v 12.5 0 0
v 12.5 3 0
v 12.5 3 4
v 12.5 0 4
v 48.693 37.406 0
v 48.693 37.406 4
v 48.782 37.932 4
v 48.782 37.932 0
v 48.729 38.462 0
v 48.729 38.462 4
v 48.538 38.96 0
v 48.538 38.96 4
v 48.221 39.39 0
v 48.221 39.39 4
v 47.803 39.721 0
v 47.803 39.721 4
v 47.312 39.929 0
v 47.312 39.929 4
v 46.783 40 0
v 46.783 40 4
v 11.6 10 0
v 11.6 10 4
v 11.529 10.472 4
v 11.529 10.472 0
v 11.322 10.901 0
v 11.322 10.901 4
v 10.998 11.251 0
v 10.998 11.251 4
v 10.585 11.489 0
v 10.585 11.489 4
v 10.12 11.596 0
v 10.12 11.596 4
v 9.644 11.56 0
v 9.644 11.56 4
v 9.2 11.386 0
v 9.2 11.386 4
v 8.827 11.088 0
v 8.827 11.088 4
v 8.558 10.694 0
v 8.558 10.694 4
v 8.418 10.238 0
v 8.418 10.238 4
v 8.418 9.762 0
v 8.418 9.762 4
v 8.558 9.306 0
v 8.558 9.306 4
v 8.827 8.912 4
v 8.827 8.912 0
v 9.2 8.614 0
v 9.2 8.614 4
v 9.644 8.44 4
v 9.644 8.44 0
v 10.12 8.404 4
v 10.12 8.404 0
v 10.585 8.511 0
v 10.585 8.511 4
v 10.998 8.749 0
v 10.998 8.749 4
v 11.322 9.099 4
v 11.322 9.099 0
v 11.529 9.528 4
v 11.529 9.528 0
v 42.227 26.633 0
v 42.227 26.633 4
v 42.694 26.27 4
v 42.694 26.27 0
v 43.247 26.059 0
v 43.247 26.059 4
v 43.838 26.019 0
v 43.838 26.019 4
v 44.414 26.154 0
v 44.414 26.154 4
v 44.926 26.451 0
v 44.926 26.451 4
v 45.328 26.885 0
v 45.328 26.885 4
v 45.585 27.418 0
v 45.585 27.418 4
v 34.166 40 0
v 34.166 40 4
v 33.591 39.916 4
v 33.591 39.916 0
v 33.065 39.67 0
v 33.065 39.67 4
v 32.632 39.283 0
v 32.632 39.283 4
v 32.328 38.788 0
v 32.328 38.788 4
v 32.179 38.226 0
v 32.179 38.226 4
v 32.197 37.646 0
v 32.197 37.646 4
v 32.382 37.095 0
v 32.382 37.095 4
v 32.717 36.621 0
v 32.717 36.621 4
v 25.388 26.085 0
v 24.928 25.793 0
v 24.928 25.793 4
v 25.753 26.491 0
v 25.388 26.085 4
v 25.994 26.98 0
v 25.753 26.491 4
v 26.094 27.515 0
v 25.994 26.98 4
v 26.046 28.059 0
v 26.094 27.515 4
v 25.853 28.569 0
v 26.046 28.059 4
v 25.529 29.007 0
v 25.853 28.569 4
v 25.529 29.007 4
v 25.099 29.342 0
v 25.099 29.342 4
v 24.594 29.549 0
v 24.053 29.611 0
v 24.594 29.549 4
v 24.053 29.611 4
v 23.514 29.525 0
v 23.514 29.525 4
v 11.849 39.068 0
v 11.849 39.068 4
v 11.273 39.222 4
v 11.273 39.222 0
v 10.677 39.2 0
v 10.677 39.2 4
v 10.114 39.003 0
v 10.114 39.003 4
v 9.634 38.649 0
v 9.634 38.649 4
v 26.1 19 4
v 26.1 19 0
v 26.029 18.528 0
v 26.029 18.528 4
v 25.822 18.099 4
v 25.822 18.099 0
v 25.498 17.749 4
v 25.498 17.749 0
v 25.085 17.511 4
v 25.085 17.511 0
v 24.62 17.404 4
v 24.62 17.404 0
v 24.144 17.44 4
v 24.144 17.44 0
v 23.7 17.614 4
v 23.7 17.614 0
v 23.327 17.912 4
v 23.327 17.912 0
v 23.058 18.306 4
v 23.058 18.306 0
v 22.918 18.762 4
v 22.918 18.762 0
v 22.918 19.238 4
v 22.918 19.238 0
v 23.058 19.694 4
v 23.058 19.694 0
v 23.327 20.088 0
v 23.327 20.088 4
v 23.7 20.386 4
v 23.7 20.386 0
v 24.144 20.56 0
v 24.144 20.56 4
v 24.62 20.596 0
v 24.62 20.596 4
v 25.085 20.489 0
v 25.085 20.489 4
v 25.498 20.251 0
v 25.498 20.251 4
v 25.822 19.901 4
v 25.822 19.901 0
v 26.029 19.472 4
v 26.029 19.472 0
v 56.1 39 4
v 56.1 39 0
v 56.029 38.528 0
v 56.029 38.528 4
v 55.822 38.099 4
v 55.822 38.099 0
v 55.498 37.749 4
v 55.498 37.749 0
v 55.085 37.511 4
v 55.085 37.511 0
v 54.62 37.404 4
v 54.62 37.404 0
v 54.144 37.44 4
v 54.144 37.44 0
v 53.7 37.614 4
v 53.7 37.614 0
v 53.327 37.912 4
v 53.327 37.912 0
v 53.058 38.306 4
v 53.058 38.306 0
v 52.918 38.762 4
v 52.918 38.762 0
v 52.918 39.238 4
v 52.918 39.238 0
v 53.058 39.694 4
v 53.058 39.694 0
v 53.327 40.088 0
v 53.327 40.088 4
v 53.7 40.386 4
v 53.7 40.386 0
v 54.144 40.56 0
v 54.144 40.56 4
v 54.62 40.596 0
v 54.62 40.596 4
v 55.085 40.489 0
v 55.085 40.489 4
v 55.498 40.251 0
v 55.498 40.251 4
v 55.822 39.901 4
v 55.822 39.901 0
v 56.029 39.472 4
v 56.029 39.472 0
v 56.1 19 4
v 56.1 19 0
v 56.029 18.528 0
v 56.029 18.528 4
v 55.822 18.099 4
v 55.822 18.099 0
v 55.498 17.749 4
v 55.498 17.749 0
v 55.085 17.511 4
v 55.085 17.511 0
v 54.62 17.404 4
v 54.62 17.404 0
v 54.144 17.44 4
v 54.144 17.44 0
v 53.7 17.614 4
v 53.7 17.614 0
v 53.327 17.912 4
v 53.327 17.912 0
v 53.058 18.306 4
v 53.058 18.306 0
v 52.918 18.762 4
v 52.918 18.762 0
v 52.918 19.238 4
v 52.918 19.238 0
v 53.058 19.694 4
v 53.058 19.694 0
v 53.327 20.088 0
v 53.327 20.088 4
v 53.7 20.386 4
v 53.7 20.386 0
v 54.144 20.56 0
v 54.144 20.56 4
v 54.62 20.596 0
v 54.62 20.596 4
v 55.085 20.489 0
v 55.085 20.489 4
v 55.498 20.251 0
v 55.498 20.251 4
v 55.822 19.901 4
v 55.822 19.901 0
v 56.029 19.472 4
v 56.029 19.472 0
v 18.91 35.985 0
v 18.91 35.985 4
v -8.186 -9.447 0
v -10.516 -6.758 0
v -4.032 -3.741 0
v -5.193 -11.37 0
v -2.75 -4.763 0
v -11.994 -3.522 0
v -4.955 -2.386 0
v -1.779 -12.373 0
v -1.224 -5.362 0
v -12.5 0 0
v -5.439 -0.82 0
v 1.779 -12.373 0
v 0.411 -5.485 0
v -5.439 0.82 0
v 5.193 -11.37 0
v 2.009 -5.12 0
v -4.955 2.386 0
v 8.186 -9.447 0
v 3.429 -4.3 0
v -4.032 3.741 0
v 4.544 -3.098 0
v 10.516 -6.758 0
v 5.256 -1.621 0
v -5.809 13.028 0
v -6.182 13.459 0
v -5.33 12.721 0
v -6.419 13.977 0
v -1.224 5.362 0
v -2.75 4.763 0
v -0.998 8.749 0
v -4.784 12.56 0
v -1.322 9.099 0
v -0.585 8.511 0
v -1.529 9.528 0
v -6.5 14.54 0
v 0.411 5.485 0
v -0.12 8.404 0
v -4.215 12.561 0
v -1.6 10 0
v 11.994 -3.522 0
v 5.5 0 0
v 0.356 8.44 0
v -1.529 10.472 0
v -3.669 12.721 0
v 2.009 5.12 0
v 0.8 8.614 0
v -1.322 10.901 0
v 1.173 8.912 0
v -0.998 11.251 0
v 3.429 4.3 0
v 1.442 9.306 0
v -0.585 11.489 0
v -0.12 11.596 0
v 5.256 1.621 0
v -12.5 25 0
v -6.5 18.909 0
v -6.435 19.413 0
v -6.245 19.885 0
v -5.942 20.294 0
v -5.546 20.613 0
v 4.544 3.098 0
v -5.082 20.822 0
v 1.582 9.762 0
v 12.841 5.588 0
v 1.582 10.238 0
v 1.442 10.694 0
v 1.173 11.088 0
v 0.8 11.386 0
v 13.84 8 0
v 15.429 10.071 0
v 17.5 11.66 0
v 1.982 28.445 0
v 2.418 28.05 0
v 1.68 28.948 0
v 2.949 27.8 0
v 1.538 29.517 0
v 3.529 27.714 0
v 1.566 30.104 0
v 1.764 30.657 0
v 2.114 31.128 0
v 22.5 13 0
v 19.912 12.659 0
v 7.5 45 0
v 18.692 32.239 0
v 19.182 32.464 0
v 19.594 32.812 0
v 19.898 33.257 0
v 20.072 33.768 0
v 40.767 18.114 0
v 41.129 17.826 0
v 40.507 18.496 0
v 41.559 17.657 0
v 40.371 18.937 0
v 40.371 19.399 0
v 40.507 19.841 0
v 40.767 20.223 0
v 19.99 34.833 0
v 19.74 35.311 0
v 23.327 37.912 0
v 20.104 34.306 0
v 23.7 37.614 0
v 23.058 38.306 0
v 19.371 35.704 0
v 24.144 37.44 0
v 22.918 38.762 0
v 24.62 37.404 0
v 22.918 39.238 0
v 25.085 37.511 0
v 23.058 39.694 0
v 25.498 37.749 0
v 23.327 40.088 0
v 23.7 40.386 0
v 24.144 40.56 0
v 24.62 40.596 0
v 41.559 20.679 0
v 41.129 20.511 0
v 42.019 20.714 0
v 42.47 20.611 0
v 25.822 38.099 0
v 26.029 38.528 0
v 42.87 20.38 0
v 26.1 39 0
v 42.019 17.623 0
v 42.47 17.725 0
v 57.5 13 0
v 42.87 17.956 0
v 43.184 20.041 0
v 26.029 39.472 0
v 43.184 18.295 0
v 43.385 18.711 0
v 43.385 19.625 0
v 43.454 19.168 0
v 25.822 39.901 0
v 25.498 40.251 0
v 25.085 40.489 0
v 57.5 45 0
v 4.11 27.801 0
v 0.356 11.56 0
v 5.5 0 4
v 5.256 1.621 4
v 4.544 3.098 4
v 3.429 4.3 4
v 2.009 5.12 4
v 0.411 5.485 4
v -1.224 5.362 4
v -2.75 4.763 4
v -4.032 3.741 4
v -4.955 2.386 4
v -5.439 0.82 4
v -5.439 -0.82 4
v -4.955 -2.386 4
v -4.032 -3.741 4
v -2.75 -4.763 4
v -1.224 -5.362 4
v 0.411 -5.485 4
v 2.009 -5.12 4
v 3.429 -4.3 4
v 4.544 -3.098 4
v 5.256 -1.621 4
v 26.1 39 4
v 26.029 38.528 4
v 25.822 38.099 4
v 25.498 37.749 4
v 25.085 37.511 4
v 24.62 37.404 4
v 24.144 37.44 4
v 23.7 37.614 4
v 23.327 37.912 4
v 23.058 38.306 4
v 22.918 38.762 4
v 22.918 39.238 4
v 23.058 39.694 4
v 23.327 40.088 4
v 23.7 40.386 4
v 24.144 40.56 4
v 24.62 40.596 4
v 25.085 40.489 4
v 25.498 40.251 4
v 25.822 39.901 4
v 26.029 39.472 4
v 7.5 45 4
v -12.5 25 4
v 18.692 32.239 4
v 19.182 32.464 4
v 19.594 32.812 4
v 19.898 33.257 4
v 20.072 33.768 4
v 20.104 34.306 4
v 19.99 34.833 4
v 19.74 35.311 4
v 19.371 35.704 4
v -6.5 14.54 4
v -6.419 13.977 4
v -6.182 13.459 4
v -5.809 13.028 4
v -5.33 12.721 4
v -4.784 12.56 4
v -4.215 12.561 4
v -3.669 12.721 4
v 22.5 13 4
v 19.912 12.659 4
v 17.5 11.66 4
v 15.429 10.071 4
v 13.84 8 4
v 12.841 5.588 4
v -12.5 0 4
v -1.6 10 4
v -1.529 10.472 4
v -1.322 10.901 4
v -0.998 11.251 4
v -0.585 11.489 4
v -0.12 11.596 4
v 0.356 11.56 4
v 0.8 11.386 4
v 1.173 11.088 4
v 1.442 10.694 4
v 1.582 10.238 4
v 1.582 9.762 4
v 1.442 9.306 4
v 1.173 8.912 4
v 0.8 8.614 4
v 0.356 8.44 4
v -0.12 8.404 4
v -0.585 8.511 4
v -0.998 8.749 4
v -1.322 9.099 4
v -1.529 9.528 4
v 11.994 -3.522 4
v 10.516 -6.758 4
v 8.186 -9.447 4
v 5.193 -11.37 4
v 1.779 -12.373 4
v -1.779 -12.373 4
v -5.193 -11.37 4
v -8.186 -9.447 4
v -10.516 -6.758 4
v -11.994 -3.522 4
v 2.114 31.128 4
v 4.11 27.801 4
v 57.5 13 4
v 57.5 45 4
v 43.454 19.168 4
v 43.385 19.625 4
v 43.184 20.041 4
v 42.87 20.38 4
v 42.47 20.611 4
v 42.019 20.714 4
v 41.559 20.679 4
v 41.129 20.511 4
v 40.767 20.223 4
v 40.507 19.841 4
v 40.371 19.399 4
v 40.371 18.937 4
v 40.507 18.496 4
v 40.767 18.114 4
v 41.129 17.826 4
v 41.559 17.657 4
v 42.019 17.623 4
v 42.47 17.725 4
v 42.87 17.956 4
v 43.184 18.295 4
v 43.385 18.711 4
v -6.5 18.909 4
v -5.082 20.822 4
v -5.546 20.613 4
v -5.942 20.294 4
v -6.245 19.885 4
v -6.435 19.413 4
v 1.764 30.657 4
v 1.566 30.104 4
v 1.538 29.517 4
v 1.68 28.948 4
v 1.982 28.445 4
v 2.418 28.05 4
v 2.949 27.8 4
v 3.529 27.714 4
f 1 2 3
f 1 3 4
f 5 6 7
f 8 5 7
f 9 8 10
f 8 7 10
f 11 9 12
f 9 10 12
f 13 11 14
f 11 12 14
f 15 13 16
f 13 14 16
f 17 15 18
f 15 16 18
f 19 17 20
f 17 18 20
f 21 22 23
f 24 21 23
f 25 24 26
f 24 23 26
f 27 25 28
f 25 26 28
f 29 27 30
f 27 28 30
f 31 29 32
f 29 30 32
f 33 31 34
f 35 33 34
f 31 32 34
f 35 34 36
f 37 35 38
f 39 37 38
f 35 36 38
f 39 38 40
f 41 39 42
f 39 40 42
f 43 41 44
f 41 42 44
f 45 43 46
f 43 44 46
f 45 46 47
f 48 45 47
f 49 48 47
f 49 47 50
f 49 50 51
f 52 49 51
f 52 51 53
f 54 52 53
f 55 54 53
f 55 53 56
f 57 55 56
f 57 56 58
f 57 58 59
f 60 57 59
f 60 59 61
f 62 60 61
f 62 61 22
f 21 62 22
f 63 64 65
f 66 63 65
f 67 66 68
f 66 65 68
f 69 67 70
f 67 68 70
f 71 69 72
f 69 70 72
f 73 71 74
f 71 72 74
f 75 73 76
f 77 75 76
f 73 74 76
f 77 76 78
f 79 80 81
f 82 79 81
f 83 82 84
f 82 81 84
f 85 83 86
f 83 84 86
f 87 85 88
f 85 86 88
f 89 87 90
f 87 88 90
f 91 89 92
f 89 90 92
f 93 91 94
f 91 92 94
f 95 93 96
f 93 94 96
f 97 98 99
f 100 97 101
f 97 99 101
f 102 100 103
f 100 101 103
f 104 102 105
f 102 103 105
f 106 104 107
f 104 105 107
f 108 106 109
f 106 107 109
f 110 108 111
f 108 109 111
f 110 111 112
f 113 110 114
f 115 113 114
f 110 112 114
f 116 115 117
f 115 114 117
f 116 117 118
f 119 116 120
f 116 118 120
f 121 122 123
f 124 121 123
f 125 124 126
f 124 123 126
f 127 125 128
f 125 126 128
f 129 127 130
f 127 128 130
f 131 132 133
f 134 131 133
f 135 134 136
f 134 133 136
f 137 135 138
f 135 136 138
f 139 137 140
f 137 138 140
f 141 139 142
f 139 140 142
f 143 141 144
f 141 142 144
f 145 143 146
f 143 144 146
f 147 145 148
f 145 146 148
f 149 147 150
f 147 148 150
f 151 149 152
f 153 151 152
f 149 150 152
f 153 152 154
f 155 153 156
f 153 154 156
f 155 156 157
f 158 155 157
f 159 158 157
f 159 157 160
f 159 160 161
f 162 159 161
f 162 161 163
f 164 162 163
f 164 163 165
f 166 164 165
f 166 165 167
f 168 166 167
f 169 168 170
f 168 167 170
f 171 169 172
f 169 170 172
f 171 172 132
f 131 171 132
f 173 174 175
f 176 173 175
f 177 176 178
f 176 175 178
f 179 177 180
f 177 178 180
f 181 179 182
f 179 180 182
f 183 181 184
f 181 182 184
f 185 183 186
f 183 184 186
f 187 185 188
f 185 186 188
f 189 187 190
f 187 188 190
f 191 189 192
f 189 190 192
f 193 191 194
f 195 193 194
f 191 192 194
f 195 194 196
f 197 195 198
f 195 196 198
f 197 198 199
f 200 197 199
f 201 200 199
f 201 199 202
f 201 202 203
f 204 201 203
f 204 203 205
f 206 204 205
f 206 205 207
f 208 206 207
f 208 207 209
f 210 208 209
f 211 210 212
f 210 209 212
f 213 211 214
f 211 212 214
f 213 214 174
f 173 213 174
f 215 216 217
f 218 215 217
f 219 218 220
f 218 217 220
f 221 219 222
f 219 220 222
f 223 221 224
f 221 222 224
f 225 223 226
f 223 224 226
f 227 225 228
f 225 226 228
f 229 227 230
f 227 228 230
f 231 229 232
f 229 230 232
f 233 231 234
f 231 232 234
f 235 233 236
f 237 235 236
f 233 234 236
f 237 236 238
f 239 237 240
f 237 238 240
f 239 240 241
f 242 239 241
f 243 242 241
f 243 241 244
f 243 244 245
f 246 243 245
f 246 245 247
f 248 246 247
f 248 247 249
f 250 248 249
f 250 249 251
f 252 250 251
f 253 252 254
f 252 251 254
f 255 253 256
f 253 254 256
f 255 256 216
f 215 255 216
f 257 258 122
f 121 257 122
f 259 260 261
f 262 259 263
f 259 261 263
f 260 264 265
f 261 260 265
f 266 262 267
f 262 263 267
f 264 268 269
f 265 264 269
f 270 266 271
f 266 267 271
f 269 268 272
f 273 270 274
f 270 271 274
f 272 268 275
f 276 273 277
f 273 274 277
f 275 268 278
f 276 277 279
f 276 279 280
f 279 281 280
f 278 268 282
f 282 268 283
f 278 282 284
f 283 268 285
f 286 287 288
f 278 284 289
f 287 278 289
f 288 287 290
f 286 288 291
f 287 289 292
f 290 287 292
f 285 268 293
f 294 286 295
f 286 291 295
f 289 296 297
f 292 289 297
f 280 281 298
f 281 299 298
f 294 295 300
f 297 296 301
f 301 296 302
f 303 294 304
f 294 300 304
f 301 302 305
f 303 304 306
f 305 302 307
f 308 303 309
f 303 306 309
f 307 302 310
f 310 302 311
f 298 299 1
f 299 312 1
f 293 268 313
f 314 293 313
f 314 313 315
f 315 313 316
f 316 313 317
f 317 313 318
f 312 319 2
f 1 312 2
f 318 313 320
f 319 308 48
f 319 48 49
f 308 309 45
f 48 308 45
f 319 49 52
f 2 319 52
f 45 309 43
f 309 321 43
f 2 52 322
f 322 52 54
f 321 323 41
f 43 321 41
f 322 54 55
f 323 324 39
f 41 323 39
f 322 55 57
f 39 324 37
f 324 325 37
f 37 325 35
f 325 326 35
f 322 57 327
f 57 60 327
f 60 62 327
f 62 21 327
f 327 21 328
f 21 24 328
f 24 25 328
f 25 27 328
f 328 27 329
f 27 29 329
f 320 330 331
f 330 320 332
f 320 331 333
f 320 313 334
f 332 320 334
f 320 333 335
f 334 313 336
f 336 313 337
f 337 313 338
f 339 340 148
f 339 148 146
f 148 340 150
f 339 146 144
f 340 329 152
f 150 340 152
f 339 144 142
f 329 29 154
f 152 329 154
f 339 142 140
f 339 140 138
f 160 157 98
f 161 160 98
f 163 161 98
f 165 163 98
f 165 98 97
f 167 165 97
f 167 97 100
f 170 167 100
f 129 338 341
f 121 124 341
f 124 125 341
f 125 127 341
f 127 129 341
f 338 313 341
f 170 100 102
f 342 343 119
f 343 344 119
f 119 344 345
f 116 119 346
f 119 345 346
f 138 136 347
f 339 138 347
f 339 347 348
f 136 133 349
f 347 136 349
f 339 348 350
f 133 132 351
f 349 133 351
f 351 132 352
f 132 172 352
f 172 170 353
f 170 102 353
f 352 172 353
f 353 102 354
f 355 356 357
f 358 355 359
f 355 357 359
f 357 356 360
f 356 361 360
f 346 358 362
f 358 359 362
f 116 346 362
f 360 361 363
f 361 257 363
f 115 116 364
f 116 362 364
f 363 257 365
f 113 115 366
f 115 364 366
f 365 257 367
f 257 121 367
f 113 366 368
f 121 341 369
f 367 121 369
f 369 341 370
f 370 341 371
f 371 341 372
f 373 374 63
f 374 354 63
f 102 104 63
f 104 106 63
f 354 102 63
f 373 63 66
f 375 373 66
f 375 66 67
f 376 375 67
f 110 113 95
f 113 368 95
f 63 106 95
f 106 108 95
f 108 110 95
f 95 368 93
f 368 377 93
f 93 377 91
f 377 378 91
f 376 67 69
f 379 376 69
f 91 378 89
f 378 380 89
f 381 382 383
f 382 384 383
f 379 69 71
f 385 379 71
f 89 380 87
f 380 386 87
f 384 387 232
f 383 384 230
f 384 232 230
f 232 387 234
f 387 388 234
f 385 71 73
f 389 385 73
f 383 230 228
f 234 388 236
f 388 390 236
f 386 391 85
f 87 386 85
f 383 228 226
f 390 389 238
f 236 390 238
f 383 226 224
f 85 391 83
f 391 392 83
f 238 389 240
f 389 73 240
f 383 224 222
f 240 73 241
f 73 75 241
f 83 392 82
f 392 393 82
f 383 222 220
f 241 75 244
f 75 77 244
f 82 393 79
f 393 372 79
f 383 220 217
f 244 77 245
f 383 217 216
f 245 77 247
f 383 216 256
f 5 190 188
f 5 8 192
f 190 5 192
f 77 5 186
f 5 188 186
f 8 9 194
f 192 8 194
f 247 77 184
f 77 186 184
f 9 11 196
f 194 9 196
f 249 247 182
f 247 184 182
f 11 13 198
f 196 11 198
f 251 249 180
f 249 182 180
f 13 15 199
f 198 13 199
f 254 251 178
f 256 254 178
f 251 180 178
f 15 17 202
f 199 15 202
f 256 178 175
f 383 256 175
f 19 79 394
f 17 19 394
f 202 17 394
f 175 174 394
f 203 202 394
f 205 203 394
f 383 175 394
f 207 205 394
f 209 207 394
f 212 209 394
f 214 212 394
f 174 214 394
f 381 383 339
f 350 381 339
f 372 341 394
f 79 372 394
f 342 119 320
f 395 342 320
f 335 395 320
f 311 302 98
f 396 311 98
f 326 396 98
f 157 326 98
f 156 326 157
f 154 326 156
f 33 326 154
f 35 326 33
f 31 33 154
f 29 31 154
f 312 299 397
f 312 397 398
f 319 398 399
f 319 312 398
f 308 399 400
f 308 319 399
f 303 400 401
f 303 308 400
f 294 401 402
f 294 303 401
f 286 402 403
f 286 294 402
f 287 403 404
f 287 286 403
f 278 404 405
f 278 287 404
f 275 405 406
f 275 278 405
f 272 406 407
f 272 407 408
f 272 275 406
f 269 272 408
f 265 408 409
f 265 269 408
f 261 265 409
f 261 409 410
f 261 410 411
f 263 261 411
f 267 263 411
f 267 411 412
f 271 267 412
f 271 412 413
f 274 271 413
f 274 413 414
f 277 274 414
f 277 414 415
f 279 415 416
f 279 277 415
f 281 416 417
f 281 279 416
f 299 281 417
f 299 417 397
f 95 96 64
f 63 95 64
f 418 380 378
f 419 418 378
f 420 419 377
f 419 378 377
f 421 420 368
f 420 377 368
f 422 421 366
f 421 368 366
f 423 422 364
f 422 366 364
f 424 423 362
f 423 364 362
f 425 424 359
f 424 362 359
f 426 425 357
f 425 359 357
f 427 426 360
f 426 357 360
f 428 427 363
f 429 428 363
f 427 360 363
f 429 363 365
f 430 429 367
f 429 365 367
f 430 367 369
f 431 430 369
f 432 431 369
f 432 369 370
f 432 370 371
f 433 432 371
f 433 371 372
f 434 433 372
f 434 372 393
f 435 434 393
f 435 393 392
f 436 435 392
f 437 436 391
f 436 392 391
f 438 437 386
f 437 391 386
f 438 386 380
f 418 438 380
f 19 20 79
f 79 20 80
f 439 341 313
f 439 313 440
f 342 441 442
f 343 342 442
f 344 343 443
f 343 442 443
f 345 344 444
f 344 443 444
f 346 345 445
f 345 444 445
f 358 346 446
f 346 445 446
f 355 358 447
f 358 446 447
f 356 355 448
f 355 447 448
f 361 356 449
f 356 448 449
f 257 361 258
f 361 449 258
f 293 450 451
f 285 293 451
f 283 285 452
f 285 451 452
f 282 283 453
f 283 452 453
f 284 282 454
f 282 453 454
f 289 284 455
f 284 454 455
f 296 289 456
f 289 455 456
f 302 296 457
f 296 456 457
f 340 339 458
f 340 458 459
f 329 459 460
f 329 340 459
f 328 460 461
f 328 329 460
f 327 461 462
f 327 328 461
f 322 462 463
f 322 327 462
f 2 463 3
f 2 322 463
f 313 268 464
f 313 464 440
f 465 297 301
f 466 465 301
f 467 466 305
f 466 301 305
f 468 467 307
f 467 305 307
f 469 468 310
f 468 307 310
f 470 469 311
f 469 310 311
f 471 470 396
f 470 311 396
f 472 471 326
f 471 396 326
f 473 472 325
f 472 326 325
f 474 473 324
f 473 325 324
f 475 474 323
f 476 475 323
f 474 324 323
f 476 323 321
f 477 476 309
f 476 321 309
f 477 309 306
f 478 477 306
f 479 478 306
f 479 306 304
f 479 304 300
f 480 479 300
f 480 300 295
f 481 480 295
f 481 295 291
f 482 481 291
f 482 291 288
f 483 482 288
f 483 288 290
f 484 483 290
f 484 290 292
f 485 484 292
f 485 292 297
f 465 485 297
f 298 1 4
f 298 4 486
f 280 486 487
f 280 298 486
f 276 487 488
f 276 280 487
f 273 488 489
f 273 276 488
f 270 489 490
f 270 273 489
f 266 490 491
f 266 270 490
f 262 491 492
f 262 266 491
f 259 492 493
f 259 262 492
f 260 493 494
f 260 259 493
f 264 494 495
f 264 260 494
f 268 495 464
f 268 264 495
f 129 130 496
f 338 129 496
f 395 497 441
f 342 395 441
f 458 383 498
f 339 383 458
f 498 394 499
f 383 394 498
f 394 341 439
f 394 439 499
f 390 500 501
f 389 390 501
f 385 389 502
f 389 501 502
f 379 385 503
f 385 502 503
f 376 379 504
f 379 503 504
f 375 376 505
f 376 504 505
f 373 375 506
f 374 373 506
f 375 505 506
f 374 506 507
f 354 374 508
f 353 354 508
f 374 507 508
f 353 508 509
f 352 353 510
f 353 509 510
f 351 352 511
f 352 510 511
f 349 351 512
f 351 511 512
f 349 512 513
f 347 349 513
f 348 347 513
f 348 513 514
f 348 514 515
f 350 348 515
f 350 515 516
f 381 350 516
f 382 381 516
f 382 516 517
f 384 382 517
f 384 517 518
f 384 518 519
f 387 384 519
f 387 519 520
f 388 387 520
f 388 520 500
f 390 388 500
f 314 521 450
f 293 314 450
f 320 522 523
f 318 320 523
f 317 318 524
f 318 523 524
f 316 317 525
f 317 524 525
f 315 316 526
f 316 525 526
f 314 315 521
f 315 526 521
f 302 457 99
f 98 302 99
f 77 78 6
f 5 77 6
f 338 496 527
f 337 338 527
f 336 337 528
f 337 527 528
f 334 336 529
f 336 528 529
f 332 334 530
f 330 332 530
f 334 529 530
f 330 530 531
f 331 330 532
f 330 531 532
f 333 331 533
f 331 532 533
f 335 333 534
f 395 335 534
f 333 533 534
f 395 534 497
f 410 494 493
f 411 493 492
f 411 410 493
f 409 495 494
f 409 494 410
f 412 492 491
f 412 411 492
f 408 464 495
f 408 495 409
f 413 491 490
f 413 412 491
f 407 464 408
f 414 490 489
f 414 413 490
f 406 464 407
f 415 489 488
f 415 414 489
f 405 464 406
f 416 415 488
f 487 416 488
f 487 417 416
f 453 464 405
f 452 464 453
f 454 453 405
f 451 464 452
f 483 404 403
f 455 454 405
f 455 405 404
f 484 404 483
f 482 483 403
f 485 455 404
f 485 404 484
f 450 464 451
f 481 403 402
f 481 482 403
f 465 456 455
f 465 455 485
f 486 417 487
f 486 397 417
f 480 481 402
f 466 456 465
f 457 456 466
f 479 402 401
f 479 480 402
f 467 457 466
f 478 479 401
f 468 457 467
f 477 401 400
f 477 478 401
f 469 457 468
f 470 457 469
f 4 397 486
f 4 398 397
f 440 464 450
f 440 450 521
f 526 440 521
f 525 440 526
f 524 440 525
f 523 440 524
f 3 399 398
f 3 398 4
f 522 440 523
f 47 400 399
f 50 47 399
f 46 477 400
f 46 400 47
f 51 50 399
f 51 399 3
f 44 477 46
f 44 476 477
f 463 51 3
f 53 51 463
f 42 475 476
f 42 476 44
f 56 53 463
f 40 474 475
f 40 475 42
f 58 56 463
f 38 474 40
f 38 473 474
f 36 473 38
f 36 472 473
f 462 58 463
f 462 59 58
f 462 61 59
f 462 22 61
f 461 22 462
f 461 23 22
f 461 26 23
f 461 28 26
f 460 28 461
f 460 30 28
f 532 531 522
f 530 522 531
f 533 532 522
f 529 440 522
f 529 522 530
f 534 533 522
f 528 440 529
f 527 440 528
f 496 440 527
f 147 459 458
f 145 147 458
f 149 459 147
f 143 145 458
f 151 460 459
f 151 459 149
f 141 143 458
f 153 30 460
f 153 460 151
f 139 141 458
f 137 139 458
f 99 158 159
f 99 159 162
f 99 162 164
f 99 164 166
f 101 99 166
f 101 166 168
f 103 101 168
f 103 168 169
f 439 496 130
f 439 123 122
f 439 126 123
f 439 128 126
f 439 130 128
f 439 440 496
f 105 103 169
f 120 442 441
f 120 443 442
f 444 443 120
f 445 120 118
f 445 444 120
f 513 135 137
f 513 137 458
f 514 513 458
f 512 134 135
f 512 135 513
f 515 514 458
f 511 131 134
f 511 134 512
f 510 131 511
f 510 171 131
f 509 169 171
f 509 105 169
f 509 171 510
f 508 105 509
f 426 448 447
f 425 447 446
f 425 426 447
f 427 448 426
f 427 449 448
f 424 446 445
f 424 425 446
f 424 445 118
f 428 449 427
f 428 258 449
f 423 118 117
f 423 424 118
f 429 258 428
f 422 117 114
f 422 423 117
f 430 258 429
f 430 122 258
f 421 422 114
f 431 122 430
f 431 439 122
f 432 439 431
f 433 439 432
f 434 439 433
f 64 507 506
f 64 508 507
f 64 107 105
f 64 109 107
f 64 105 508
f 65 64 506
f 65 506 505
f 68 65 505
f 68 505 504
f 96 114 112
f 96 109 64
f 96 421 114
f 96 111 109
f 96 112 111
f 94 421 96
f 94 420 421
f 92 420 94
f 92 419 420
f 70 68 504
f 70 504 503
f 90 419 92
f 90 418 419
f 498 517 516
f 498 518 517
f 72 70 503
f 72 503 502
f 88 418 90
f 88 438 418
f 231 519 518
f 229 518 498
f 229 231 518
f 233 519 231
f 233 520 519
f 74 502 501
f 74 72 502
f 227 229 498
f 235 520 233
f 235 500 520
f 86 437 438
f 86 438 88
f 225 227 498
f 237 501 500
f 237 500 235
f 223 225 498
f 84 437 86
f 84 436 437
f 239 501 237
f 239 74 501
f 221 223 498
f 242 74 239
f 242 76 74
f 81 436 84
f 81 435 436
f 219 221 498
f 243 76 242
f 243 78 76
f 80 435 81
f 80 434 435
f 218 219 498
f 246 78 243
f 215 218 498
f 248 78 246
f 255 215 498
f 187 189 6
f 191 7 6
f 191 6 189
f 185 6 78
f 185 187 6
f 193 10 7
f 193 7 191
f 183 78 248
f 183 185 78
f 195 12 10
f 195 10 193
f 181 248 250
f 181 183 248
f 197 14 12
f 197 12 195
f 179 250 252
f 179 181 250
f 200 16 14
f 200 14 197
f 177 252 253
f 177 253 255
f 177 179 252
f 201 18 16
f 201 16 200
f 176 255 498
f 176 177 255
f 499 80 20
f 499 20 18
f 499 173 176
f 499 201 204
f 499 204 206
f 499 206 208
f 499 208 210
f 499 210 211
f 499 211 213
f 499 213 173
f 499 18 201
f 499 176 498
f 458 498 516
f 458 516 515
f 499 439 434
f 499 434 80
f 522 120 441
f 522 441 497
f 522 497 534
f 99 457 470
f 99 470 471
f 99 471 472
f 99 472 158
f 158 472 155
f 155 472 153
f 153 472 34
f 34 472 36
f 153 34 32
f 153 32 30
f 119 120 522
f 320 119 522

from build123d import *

# Parameters (mm, degrees)
SKETCH_1_R          = 1.6
SKETCH_1_R_2        = 6.075
EXTRUDE_1_DEPTH     = 4
CUT_EXTRUDE_1_REACH = 75.125
SKETCH_2_R          = 1.6
CUT_EXTRUDE_2_REACH = 75.125
SKETCH_3_R          = 1.6
CUT_EXTRUDE_3_REACH = 75.125
SKETCH_4_R          = 1.55
EXTRUDE_START       = -4
SKETCH_5_R          = 6.075
SKETCH_5_R_2        = 5.5
EXTRUDE_2_DEPTH     = 4
CHAMFER_1_SIZE      = 20
CUT_EXTRUDE_4_DEPTH = 10


with BuildPart() as part:
    # 草图1 → 凸台-拉伸1 (new body)
    with BuildSketch(Plane(origin=(0, 0, 0), x_dir=(-1, 0, 0), z_dir=(0, 0, -1))):
        with BuildLine():
            Line((12.5, 0), (12.5, 15))
            Line((12.5, 15), (12.5, 45))
            Line((12.5, 45), (-17.5, 45))
            Line((-17.5, 45), (-57.5, 45))
            Line((-57.5, 45), (-57.5, 13))
            Line((-57.5, 13), (-22.5, 13))
            ThreePointArc((-22.5, 13), (-15.428932188, 10.071067812), (-12.5, 3))
            Line((-12.5, 3), (-12.5, 0))
            ThreePointArc((-12.5, 0), (0, -12.5), (12.5, 0))
        make_face()
        with Locations(Location((-54.5, 19, 0), (0, 0, 180))):
            Circle(SKETCH_1_R, mode=Mode.SUBTRACT)
        with Locations(Location((-24.5, 19, 0), (0, 0, 180))):
            Circle(SKETCH_1_R, mode=Mode.SUBTRACT)
        with Locations(Location((-24.5, 39, 0), (0, 0, 180))):
            Circle(SKETCH_1_R, mode=Mode.SUBTRACT)
        with Locations(Location((-54.5, 39, 0), (0, 0, 180))):
            Circle(SKETCH_1_R, mode=Mode.SUBTRACT)
        with Locations(Location((0, 0, 0), (0, 0, 180))):
            Circle(SKETCH_1_R_2, mode=Mode.SUBTRACT)
    extrude(amount=-EXTRUDE_1_DEPTH)

    # 草图2 → 切除-拉伸1 (cut, up to next)
    with BuildSketch(Plane(origin=(0, 0, 0), x_dir=(-1, 0, 0), z_dir=(0, 0, -1)), mode=Mode.PRIVATE) as cut_extrude_1_sk1:
        with Locations((0, 10)):
            Circle(SKETCH_2_R)
    cut_extrude_1_tool1 = extrude(cut_extrude_1_sk1.sketch, amount=-CUT_EXTRUDE_1_REACH, mode=Mode.PRIVATE) & part.part
    add(cut_extrude_1_tool1.solids().sort_by_distance((0, 10, 0))[0], mode=Mode.SUBTRACT)

    # 草图3 → 切除-拉伸2 (cut, up to next)
    with BuildSketch(Plane.XY.offset(4), mode=Mode.PRIVATE) as cut_extrude_2_sk1:
        with Locations((10, 10)):
            Circle(SKETCH_3_R)
    cut_extrude_2_tool1 = extrude(cut_extrude_2_sk1.sketch, amount=-CUT_EXTRUDE_2_REACH, mode=Mode.PRIVATE) & part.part
    add(cut_extrude_2_tool1.solids().sort_by_distance((10, 10, 4))[0], mode=Mode.SUBTRACT)

    # 草图4 → 切除-拉伸3 (cut, up to next)
    with BuildSketch(Plane.XY.offset(4), mode=Mode.PRIVATE) as cut_extrude_3_sk1:
        with Locations((41.903612375, 19.168270074)):
            Circle(SKETCH_4_R)
    cut_extrude_3_tool1 = extrude(cut_extrude_3_sk1.sketch, amount=-CUT_EXTRUDE_3_REACH, mode=Mode.PRIVATE) & part.part
    add(cut_extrude_3_tool1.solids().sort_by_distance((41.903612, 19.16827, 4))[0], mode=Mode.SUBTRACT)

    # 草图5 → 凸台-拉伸2 (add)
    with BuildSketch(Plane.XY.offset(4).offset(EXTRUDE_START)):
        Circle(SKETCH_5_R)
        Circle(SKETCH_5_R_2, mode=Mode.SUBTRACT)
    extrude(amount=EXTRUDE_2_DEPTH)

    # 倒角1
    chamfer_1_edges = [part.edges().sort_by_distance(p)[0] for p in [
        (-12.5, 45, 2),
    ]]
    chamfer(chamfer_1_edges, length=CHAMFER_1_SIZE)

    # 草图6 → 切除-拉伸4 (cut)
    with BuildSketch(Plane.XY.offset(4)):
        with BuildLine():
            Line((9.634482471, 38.649201097), (2.113604897, 31.128323523))
            ThreePointArc((2.113604897, 31.128323523), (1.812829409, 28.685123781), (4.110129794, 27.800758579))
            Line((4.110129794, 27.800758579), (18.692042435, 32.238632926))
            ThreePointArc((18.692042435, 32.238632926), (20.106354196, 34.035811099), (18.910017796, 35.984889435))
            Line((18.910017796, 35.984889435), (11.848982729, 39.067892662))
            ThreePointArc((11.848982729, 39.067892662), (10.677142261, 39.200171443), (9.634482471, 38.649201097))
        make_face()
        with BuildLine():
            Line((32.71747005, 36.620860129), (42.227284145, 26.633201667))
            ThreePointArc((42.227284145, 26.633201667), (44.130956278, 26.064840044), (45.58542604, 27.418176749))
            Line((45.58542604, 27.418176749), (48.692879305, 37.405835211))
            ThreePointArc((48.692879305, 37.405835211), (48.393816721, 39.185679219), (46.783175609, 40))
            Line((46.783175609, 40), (34.165908249, 40))
            ThreePointArc((34.165908249, 40), (32.327664557, 38.787946781), (32.71747005, 36.620860129))
        make_face()
        with BuildLine():
            Line((-6.5, 18.908624945), (-6.5, 14.540152244))
            ThreePointArc((-6.5, 14.540152244), (-5.580990037, 12.857457816), (-3.668539461, 12.721176331))
            Line((-3.668539461, 12.721176331), (24.927936602, 25.79273008))
            ThreePointArc((24.927936602, 25.79273008), (25.966793038, 28.320165173), (23.514164728, 29.525057374))
            Line((23.514164728, 29.525057374), (-5.082311335, 20.821976327))
            ThreePointArc((-5.082311335, 20.821976327), (-6.106957166, 20.099292264), (-6.5, 18.908624945))
        make_face()
    extrude(amount=-CUT_EXTRUDE_4_DEPTH, mode=Mode.SUBTRACT)


solid = part.part
